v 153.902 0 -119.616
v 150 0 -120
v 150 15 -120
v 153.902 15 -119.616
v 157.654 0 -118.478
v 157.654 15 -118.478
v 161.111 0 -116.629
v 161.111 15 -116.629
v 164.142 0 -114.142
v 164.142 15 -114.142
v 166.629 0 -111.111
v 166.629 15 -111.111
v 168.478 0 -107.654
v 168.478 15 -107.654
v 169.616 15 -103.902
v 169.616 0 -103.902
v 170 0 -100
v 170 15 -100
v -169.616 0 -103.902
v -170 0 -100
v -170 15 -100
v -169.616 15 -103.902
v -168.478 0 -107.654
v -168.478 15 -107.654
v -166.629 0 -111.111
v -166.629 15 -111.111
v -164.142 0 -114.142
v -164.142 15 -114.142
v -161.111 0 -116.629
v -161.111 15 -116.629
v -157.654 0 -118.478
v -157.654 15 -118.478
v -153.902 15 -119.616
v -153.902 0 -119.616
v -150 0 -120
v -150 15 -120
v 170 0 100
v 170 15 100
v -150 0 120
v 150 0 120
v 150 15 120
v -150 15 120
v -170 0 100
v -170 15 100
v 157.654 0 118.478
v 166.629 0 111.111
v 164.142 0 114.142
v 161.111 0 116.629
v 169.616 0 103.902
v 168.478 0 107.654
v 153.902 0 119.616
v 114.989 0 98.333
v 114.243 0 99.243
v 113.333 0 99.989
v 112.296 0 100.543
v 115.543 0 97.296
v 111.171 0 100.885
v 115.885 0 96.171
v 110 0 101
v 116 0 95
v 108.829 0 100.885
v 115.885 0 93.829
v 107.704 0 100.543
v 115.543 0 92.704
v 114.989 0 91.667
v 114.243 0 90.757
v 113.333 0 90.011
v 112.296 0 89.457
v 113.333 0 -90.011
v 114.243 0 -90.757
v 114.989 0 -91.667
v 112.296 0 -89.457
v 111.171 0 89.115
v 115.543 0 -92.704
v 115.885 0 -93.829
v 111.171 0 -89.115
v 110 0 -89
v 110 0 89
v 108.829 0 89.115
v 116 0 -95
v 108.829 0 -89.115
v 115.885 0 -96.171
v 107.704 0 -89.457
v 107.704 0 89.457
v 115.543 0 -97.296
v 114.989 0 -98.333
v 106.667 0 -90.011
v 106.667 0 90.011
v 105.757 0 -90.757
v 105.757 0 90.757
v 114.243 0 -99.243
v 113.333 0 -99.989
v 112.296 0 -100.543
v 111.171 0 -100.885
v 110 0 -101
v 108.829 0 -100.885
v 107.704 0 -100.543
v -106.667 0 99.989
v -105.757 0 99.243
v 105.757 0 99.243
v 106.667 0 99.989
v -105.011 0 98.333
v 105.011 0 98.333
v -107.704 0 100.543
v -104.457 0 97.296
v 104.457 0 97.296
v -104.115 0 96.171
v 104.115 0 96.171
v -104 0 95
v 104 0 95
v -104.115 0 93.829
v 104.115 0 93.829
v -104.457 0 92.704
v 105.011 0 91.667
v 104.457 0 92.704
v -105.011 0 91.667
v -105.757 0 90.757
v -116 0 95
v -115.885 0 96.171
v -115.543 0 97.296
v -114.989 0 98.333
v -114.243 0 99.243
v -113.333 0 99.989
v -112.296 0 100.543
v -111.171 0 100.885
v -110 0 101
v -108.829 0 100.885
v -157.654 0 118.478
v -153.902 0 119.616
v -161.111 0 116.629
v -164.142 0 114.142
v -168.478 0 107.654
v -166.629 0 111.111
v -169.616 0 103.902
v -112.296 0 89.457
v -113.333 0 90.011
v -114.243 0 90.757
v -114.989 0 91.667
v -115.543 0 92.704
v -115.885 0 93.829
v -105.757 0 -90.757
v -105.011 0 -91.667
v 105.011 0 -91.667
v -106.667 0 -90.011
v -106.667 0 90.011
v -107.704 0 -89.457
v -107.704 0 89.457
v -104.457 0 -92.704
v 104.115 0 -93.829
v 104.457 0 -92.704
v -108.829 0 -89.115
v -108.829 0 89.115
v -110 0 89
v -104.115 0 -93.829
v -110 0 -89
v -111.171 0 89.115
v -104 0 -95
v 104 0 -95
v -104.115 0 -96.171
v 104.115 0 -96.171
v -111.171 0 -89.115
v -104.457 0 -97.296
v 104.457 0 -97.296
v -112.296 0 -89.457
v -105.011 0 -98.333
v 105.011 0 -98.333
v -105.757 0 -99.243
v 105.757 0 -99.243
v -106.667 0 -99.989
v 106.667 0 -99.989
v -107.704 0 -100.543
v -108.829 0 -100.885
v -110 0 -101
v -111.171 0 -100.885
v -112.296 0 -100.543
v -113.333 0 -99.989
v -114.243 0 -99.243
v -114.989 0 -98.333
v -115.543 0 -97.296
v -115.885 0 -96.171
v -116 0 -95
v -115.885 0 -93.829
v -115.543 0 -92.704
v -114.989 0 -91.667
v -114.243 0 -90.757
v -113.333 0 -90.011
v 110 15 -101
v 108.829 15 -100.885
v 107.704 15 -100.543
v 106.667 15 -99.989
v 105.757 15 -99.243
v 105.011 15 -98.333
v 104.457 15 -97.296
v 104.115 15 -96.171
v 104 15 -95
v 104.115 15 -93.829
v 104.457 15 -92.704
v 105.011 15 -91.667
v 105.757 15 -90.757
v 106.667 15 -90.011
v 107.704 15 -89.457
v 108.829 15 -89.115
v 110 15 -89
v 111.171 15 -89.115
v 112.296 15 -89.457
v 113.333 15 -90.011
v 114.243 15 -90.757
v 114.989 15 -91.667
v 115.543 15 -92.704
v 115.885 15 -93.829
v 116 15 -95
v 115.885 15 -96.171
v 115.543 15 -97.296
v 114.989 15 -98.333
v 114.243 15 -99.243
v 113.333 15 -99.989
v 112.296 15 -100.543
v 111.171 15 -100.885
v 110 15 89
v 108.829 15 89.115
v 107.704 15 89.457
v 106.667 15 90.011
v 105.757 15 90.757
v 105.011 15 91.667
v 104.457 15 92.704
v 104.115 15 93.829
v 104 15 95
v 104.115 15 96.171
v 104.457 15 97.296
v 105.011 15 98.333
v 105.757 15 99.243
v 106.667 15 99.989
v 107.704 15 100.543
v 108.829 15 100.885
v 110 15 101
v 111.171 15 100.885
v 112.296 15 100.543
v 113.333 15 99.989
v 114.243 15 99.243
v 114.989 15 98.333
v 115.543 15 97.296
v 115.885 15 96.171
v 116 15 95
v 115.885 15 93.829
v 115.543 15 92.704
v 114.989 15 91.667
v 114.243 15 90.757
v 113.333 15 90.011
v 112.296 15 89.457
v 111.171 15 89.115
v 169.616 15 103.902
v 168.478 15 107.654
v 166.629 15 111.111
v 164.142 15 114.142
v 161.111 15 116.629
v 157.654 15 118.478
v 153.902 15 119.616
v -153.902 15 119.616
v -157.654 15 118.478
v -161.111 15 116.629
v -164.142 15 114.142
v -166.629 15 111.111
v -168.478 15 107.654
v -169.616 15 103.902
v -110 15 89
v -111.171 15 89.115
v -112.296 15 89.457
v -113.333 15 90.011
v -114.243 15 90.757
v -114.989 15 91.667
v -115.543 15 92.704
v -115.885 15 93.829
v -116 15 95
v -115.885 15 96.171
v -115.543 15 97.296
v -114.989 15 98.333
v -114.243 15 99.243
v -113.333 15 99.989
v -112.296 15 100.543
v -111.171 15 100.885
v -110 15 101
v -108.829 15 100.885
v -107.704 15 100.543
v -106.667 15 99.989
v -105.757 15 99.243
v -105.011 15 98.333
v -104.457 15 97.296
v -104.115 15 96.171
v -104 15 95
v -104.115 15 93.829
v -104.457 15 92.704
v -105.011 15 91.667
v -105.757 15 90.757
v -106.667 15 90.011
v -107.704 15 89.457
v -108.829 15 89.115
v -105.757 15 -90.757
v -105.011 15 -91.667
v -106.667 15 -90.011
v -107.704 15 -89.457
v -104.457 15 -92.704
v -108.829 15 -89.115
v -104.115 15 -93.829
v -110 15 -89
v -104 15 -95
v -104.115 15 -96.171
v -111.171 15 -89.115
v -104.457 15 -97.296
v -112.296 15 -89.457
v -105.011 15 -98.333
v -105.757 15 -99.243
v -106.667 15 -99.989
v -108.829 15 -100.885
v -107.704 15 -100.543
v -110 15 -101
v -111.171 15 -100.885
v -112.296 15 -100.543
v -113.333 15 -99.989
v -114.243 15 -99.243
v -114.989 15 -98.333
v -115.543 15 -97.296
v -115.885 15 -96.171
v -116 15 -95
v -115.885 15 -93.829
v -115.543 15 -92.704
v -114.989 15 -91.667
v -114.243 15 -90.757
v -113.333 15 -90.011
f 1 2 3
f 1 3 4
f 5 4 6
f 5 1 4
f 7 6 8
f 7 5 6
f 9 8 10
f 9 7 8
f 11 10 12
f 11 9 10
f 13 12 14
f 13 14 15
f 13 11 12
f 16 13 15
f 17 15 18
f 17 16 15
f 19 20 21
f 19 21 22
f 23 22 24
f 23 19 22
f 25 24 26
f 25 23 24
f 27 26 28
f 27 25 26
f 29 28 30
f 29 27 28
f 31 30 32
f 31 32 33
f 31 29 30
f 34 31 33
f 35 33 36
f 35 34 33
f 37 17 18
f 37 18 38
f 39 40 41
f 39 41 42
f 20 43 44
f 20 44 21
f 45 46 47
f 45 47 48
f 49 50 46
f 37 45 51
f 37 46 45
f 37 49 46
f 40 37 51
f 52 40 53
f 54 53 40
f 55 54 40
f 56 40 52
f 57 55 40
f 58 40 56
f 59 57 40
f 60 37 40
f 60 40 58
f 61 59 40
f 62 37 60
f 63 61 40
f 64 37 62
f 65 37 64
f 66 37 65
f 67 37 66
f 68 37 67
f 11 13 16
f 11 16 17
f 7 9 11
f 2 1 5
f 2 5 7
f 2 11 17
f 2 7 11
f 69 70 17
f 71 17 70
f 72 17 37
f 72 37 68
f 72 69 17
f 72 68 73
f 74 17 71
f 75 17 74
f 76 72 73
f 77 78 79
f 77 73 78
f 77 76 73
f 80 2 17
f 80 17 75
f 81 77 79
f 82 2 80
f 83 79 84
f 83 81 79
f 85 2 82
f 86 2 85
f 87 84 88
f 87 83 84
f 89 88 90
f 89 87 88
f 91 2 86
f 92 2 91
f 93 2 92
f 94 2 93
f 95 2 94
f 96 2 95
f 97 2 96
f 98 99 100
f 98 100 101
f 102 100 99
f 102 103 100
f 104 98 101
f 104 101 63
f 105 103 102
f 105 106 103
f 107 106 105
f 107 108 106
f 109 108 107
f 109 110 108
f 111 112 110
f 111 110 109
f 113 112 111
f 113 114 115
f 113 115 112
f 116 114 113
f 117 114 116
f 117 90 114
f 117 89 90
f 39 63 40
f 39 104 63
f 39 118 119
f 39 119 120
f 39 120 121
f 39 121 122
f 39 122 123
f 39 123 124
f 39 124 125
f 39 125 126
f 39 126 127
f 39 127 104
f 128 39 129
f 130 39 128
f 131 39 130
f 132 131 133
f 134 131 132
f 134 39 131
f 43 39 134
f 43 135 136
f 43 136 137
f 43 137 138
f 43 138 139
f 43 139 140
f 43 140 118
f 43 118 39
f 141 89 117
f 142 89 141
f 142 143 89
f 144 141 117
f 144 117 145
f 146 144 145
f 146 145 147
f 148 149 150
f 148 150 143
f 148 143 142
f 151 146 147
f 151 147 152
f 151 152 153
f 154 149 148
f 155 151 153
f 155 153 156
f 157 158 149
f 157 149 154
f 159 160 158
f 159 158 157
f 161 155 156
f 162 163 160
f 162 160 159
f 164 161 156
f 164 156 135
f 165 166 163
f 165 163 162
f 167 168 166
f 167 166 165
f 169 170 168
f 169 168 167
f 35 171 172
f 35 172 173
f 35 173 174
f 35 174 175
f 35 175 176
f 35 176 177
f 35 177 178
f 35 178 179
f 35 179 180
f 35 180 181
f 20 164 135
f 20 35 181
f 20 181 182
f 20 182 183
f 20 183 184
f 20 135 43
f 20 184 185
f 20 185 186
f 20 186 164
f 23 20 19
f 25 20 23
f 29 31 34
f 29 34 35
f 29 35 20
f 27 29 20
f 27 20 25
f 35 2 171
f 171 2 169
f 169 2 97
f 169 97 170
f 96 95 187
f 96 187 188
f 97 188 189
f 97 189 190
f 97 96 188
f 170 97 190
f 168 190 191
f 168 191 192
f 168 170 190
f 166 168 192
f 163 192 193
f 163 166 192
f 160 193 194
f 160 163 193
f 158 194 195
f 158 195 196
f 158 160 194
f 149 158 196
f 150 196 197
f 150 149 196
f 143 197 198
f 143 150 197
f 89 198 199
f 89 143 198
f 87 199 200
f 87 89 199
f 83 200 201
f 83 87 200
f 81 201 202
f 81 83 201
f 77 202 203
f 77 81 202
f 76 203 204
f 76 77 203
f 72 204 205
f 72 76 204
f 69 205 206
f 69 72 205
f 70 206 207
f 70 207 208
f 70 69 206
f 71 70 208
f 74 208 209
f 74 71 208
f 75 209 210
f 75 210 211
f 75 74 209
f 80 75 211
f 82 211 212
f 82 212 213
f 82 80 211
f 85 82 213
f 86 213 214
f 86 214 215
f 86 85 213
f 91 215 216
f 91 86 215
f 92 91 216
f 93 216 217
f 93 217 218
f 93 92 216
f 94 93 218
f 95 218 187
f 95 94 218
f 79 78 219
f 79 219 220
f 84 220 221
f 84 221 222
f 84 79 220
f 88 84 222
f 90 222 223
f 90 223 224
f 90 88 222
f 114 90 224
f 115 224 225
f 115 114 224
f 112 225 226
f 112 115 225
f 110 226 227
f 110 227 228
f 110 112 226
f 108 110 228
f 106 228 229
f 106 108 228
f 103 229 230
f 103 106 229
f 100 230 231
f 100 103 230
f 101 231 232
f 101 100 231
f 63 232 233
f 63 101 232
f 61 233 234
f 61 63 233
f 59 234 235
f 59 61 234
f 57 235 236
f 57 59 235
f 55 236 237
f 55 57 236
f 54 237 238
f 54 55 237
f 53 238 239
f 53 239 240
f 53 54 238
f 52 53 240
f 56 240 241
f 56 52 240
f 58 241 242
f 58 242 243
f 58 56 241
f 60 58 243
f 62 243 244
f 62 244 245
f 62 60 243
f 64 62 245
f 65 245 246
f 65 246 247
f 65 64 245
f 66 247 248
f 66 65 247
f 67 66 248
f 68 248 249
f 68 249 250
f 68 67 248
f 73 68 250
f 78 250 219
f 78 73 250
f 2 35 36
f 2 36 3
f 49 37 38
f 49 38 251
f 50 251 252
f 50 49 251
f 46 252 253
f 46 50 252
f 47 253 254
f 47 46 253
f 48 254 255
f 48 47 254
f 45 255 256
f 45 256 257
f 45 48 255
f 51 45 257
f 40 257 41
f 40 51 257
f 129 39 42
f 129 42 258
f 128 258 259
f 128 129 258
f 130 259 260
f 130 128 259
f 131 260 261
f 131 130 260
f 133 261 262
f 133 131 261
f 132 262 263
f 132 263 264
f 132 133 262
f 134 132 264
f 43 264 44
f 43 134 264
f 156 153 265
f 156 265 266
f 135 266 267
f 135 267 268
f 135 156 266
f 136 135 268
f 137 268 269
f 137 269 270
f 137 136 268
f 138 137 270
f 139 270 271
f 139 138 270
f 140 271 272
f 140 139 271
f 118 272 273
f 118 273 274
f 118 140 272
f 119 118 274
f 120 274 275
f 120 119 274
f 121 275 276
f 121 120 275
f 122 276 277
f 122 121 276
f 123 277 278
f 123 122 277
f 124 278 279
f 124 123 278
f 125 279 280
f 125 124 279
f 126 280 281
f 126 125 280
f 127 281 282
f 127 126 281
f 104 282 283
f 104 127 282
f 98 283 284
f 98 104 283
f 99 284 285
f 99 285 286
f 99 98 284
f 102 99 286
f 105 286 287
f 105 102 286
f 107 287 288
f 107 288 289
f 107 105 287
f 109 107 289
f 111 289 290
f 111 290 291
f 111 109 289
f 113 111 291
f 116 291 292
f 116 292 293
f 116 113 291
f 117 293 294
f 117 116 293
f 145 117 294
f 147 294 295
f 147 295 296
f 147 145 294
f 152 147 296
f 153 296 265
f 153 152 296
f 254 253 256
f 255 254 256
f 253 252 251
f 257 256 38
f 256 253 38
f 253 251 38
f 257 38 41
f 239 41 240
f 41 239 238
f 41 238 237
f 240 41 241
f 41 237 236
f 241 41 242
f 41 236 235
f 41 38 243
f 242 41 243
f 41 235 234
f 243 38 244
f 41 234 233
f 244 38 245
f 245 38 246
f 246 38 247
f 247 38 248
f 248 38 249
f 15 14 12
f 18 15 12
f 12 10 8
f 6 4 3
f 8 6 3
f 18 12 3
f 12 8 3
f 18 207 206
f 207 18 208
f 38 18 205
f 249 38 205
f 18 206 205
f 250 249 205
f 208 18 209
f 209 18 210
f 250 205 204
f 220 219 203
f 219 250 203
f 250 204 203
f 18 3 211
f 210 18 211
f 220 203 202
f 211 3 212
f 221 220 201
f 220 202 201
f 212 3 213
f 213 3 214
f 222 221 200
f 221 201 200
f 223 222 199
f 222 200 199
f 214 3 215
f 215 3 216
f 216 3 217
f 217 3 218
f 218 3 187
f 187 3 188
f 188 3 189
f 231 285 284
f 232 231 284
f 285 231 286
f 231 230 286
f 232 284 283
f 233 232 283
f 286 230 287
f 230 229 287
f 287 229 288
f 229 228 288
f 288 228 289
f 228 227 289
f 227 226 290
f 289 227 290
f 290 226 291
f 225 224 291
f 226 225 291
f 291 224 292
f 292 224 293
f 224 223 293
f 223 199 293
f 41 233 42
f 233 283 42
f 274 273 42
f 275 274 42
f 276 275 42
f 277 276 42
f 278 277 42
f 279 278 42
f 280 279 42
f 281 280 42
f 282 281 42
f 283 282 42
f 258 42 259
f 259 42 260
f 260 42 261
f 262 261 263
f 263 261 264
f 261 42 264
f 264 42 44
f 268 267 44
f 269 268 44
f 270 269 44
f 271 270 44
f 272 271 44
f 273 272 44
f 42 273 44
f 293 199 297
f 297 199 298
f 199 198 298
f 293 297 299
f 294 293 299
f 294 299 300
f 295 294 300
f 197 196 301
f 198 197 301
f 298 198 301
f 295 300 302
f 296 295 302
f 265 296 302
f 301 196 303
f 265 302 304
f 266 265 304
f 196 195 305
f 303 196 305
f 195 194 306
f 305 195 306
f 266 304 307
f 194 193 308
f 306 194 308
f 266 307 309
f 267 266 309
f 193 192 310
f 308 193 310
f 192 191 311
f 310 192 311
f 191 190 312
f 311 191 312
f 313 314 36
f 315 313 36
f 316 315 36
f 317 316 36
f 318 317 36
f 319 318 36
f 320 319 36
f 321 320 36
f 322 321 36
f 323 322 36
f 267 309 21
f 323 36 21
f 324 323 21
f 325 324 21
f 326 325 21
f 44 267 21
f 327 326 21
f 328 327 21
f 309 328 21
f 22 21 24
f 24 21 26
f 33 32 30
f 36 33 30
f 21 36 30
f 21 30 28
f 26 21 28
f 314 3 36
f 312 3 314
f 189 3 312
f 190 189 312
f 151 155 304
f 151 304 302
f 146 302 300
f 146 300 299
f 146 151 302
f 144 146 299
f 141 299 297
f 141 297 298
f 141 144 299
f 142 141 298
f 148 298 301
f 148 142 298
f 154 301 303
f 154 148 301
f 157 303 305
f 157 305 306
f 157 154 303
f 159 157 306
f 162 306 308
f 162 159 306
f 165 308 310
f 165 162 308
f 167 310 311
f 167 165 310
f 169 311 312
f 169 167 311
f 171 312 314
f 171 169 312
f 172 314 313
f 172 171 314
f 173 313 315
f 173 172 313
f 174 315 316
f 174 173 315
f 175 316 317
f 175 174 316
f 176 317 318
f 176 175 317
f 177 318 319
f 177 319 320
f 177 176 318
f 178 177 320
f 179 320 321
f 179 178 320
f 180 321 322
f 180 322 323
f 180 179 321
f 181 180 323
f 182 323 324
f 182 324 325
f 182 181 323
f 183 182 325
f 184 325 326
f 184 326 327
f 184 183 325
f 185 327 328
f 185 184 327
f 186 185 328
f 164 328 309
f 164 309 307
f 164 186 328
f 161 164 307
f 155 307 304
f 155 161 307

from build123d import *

# Parameters (mm, degrees)
EXTRUDE_1_DEPTH      = 15
SKETCH_2_10_R        = 6
CUT_EXTRUDE_10_DEPTH = 15
SKETCH_2_11_R        = 6
CUT_EXTRUDE_11_DEPTH = 15
SKETCH_2_12_R        = 6
CUT_EXTRUDE_12_DEPTH = 15
SKETCH_2_13_R        = 6
CUT_EXTRUDE_13_DEPTH = 15


with BuildPart() as part:
    # 草图2 → 凸台-拉伸1 (new body)
    with BuildSketch(Plane(origin=(0, 0, 0), x_dir=(1, 0, 0), z_dir=(0, 1, 0))):
        with BuildLine():
            Line((-150, 120), (150, 120))
            ThreePointArc((150, 120), (164.142135624, 114.142135624), (170, 100))
            Line((170, 100), (170, -100))
            ThreePointArc((170, -100), (164.142135624, -114.142135624), (150, -120))
            Line((150, -120), (-150, -120))
            ThreePointArc((-150, -120), (-164.142135624, -114.142135624), (-170, -100))
            Line((-170, -100), (-170, 100))
            ThreePointArc((-170, 100), (-164.142135624, 114.142135624), (-150, 120))
        make_face()
    extrude(amount=EXTRUDE_1_DEPTH)

    # 草图2<10> → 切除-拉伸10 (cut)
    with BuildSketch(Plane(origin=(0, 0, 0), x_dir=(1, 0, 0), z_dir=(0, 1, 0))):
        with Locations((-110, -95)):
            Circle(SKETCH_2_10_R)
    extrude(amount=CUT_EXTRUDE_10_DEPTH, mode=Mode.SUBTRACT)

    # 草图2<11> → 切除-拉伸11 (cut)
    with BuildSketch(Plane(origin=(0, 0, 0), x_dir=(1, 0, 0), z_dir=(0, 1, 0))):
        with Locations((110, -95)):
            Circle(SKETCH_2_11_R)
    extrude(amount=CUT_EXTRUDE_11_DEPTH, mode=Mode.SUBTRACT)

    # 草图2<12> → 切除-拉伸12 (cut)
    with BuildSketch(Plane(origin=(0, 0, 0), x_dir=(1, 0, 0), z_dir=(0, 1, 0))):
        with Locations((-110, 95)):
            Circle(SKETCH_2_12_R)
    extrude(amount=CUT_EXTRUDE_12_DEPTH, mode=Mode.SUBTRACT)

    # 草图2<13> → 切除-拉伸13 (cut)
    with BuildSketch(Plane(origin=(0, 0, 0), x_dir=(1, 0, 0), z_dir=(0, 1, 0))):
        with Locations((110, 95)):
            Circle(SKETCH_2_13_R)
    extrude(amount=CUT_EXTRUDE_13_DEPTH, mode=Mode.SUBTRACT)


solid = part.part
